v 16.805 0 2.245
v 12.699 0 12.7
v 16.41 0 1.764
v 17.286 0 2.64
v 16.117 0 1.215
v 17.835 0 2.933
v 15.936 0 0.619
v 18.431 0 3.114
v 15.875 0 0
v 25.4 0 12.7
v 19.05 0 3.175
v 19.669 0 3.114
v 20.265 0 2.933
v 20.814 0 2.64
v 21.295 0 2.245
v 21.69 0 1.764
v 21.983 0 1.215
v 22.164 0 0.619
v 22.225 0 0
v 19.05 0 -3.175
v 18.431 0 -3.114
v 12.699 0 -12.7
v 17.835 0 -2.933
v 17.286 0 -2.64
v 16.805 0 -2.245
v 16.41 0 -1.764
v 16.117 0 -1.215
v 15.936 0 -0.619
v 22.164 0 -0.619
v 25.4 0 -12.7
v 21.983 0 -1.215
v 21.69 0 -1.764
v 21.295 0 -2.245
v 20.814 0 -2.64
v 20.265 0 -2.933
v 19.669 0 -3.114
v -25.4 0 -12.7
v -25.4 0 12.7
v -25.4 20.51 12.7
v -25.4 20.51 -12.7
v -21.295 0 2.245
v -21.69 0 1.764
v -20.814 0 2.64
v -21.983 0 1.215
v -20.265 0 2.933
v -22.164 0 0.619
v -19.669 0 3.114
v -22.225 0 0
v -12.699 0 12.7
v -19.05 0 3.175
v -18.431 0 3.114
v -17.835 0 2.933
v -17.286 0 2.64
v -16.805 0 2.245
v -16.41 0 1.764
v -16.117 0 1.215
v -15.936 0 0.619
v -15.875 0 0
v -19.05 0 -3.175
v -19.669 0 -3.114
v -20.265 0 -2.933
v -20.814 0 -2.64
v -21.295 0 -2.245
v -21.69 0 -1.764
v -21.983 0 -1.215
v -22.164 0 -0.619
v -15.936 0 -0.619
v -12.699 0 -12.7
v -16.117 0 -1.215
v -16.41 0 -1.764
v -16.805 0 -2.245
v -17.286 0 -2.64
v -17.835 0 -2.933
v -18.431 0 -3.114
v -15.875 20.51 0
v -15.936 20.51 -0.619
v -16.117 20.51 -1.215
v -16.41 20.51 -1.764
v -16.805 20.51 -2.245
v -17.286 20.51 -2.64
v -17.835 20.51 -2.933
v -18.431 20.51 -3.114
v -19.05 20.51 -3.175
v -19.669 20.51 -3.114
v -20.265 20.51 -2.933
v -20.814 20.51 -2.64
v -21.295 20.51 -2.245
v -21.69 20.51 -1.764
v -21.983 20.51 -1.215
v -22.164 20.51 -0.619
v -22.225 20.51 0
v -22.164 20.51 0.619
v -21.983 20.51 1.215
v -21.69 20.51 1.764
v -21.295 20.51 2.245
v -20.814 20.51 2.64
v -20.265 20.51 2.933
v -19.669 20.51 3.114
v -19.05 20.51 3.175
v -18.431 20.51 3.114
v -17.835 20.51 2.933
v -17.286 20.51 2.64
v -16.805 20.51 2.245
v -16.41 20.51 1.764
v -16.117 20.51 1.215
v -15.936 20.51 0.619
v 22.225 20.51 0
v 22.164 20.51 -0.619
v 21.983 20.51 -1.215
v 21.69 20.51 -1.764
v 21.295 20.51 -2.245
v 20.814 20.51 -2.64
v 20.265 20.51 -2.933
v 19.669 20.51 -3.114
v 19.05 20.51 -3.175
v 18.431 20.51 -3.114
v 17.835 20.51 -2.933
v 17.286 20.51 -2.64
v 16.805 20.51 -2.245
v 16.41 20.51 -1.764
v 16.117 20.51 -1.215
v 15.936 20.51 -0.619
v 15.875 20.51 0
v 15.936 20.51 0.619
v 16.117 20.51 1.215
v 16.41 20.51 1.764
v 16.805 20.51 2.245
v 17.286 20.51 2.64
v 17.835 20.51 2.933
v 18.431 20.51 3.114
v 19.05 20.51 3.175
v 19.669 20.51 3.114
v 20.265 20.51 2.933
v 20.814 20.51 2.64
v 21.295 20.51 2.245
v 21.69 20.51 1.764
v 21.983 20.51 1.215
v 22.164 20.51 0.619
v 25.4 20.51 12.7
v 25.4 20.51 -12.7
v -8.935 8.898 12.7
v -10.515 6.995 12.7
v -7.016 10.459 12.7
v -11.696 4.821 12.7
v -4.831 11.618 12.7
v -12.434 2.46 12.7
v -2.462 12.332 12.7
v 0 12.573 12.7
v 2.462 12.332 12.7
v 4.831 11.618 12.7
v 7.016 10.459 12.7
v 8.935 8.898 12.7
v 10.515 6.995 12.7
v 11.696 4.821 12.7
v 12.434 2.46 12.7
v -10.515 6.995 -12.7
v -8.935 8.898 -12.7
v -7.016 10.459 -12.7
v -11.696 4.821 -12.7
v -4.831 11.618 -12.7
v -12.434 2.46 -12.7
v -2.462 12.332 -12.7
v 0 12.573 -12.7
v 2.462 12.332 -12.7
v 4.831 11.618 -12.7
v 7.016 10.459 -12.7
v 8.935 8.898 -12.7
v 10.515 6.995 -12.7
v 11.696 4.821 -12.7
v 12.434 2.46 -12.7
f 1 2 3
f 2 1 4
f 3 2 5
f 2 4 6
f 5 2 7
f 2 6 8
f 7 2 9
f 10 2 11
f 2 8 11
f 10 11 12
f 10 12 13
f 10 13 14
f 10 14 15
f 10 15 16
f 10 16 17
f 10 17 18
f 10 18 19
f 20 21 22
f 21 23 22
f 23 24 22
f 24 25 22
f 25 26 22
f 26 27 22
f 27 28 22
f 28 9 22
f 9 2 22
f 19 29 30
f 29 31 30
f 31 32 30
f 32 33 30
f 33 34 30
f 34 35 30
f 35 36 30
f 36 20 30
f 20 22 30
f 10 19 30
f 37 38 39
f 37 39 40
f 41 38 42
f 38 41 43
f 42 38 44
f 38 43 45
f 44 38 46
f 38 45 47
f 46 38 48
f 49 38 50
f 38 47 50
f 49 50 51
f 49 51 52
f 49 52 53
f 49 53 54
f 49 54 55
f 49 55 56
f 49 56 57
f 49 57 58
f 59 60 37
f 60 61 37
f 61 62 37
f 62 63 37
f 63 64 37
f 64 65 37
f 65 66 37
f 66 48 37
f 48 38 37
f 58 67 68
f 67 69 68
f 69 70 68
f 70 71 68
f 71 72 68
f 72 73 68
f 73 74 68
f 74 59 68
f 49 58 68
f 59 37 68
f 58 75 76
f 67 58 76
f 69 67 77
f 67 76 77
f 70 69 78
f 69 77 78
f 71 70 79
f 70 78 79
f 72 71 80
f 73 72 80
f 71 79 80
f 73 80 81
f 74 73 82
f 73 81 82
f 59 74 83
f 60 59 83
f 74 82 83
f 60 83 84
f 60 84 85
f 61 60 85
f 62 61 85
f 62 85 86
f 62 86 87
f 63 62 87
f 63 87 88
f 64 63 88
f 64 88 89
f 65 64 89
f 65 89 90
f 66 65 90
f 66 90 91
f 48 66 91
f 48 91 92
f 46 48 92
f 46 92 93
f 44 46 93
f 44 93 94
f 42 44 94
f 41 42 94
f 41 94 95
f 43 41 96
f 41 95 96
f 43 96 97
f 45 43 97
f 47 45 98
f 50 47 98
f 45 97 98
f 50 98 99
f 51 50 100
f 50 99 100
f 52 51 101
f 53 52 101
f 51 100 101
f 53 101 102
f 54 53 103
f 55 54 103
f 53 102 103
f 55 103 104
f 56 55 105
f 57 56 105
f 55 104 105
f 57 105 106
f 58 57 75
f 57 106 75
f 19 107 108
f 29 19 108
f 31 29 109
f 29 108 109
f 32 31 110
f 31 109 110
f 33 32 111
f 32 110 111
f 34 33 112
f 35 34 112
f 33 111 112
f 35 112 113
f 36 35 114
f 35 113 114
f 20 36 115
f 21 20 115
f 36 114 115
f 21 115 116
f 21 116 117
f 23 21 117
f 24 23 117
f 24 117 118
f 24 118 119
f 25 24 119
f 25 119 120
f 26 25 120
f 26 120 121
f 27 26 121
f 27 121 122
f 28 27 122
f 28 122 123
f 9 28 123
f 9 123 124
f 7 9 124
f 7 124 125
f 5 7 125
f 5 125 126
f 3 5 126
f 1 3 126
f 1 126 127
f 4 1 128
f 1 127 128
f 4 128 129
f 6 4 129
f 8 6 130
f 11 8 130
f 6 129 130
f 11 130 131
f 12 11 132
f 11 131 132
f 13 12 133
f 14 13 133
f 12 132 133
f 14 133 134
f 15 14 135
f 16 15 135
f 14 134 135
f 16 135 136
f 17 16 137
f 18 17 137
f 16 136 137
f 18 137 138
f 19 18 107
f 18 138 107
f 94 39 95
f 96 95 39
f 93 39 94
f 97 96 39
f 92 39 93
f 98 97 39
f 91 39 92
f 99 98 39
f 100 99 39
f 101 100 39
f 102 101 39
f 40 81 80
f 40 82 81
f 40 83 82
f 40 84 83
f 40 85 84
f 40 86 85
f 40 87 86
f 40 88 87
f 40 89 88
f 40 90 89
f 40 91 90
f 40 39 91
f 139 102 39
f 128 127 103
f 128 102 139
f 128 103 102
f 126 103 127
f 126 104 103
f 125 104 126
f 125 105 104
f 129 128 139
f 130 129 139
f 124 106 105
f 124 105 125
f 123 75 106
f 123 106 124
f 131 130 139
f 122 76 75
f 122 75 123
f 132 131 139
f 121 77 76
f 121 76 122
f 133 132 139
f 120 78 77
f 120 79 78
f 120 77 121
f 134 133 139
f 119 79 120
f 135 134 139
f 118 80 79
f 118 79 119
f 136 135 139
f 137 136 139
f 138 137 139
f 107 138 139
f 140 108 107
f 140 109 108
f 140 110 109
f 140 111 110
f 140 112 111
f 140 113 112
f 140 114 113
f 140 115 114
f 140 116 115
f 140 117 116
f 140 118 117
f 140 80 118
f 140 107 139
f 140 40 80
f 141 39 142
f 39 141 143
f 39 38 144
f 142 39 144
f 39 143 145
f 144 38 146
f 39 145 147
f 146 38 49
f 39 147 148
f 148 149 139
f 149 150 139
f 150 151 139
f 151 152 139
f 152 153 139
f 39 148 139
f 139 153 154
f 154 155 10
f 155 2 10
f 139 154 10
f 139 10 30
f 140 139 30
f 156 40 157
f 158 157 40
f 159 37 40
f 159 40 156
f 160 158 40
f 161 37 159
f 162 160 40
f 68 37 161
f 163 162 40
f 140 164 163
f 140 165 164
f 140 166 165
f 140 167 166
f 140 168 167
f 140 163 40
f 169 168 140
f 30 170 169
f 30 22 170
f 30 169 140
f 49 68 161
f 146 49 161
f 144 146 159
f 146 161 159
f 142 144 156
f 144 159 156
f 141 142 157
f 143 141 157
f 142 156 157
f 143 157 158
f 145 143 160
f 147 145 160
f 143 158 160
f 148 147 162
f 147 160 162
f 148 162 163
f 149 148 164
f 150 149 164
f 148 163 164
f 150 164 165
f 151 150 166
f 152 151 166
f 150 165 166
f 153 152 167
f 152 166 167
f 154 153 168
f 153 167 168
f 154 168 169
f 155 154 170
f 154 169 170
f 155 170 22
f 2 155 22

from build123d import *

# Parameters (mm, degrees)
SKETCH1_W        = 50.8
SKETCH1_H        = 25.4
BLOCK_DEPTH      = 20.5105
SKETCH3_R        = 12.7
SHAFT_HOLE_DEPTH = 42.364243136
CLAMPING_HOLES_D = 6.35


with BuildPart() as part:
    # Sketch1 → Block (new body)
    with BuildSketch(Plane(origin=(0, 0, 0), x_dir=(1, 0, 0), z_dir=(0, 1, 0))):
        Rectangle(SKETCH1_W, SKETCH1_H)
    extrude(amount=BLOCK_DEPTH)

    # Sketch3 → Shaft Hole (cut, through all)
    with BuildSketch(Plane(origin=(0, 0, -12.7), x_dir=(-1, 0, 0), z_dir=(0, 0, -1))):
        with Locations((0, -0.127)):
            Circle(SKETCH3_R)
    extrude(amount=-SHAFT_HOLE_DEPTH, mode=Mode.SUBTRACT)

    # Clamping Holes (through all)
    with Locations(Plane(origin=(0, 0, 0), x_dir=(-1, 0, 0), z_dir=(0, -1, 0))):
        with Locations((-19.05, 0), (19.05, 0)):
            Hole(CLAMPING_HOLES_D / 2)


solid = part.part
